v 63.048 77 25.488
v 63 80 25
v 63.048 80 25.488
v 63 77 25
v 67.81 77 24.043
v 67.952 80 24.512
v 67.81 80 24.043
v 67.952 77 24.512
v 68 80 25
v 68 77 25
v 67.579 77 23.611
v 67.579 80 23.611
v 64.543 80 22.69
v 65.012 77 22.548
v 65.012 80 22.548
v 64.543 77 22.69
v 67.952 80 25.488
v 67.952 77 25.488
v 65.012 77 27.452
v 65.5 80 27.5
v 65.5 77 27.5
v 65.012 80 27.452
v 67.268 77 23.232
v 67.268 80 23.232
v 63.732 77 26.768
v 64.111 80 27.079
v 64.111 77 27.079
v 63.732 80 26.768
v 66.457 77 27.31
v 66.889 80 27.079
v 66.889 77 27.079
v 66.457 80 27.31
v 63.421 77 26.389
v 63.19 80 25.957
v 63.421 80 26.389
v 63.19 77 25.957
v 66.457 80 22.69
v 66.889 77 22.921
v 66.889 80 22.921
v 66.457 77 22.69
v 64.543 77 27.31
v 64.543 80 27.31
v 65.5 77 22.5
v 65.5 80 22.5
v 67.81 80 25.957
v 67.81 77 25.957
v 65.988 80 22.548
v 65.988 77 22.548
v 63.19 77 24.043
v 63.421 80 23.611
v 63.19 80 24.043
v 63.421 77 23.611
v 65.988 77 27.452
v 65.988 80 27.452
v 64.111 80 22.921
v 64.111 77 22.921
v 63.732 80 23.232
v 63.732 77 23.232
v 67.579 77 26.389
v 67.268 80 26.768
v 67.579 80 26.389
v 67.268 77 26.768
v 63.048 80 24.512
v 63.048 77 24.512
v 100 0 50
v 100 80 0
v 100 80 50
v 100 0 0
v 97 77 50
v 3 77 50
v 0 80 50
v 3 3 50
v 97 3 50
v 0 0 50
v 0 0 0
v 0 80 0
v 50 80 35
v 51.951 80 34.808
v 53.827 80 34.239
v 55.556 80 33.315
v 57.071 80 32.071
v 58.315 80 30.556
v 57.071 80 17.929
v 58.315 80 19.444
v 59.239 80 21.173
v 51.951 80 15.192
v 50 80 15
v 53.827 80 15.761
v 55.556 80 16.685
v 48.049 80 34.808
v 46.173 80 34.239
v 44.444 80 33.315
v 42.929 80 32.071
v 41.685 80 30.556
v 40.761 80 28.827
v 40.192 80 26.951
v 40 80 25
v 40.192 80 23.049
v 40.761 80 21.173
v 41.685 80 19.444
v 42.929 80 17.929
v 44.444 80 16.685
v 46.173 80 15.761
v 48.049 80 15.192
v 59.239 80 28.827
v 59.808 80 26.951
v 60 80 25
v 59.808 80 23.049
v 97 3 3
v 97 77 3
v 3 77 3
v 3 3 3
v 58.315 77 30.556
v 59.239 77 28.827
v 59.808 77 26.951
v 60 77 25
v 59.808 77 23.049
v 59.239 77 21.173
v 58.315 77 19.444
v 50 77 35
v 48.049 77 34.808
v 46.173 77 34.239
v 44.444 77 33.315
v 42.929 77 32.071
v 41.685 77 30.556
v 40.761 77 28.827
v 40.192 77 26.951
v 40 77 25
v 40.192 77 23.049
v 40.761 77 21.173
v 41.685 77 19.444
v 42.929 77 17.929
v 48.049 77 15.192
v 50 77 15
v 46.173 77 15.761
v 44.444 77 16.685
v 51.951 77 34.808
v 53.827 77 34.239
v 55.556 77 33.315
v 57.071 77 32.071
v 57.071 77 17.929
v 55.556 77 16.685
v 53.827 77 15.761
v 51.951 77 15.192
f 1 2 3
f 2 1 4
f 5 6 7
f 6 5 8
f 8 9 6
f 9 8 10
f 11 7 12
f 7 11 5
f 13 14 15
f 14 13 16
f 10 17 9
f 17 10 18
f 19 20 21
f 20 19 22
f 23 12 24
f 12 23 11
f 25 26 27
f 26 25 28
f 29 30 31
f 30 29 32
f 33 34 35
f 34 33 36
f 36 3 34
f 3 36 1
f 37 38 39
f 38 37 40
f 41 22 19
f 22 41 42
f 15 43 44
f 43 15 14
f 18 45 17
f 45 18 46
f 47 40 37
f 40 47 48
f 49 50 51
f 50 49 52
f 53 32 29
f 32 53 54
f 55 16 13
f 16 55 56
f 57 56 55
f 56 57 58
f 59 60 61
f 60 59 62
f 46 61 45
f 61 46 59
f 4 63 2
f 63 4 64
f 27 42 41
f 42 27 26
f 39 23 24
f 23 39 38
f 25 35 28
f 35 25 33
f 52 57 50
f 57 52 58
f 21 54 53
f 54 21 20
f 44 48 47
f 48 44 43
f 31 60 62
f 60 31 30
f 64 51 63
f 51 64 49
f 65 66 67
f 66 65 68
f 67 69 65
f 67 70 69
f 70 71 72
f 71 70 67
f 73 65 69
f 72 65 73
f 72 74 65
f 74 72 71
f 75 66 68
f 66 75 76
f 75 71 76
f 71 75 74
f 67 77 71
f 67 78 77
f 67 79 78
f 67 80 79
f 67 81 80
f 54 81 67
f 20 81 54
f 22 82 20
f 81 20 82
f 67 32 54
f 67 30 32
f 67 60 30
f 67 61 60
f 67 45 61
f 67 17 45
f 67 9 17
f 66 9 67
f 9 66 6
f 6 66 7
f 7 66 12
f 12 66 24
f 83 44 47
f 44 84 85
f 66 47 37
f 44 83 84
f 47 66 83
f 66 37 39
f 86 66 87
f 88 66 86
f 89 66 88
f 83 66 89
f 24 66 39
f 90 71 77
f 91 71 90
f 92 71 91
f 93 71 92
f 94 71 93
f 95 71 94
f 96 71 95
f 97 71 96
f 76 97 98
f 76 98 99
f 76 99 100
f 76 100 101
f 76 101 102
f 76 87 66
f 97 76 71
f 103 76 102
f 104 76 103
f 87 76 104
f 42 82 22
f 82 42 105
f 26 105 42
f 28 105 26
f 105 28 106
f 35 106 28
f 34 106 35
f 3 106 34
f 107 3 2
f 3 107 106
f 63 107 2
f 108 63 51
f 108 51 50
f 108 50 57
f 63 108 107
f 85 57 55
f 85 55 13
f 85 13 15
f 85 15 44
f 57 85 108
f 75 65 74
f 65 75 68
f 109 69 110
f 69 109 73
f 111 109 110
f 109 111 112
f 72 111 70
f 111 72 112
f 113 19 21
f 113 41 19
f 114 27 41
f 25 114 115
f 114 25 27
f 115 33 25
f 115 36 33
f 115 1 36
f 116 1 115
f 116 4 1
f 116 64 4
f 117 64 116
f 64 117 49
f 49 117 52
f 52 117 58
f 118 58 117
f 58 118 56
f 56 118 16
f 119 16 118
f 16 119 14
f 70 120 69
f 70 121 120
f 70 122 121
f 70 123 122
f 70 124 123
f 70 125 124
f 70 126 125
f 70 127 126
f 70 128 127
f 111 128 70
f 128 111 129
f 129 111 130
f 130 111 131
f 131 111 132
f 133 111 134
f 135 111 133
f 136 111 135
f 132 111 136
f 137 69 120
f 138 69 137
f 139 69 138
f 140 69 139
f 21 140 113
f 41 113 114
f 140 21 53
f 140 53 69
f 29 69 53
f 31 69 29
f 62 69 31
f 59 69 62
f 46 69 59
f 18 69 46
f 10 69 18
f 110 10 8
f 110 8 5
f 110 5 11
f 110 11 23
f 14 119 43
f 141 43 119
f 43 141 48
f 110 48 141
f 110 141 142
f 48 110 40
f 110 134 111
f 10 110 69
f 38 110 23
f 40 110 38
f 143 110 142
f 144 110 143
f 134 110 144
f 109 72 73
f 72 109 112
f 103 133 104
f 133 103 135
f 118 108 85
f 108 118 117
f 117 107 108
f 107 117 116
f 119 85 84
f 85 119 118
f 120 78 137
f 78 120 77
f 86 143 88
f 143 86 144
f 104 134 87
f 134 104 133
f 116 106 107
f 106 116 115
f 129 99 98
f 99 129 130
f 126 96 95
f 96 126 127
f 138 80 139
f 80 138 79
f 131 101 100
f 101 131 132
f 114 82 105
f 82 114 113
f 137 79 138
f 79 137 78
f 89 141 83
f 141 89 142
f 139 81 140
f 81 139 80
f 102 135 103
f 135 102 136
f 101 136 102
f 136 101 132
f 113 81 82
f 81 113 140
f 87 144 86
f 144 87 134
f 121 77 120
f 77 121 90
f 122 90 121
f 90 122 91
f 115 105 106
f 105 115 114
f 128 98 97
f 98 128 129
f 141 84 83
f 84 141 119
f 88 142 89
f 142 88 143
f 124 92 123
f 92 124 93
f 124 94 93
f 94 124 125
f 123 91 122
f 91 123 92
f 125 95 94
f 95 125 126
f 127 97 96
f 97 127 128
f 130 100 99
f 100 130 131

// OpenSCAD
$fn = 32;

// ----------------------------------------------------------------------
// Vent box: roundvent enclosure
// ----------------------------------------------------------------------

// --- parameters (mm) ---
box_l = 100;              // box length, X
box_w = 80;               // box width, Y
box_h = 50;               // box height, Z
wall_t = 3;               // shell wall thickness
vent_d = 20;              // central vent diameter
ring_d = 5;               // ring hole diameter
n_ring = 8;               // holes in the ring
ring_r = 15.5;            // ring radius

ring_step = 360 / n_ring;  // ring hole angular step

difference() {
  cube([box_l, box_w, box_h]);
  translate([wall_t, wall_t, wall_t])
    cube([box_l - 2 * wall_t, box_w - 2 * wall_t, box_h]);
  translate([box_l / 2, box_w - wall_t - 1, box_h / 2])
    rotate([-90, 0, 0]) cylinder(h = wall_t + 2, d = vent_d);
  for (i = [0 : n_ring - 1])
    translate([box_l / 2, box_w - wall_t - 1, box_h / 2])
      rotate([0, 0, i * ring_step])
        translate([ring_r, 0, 0]) rotate([-90, 0, 0])
          cylinder(h = wall_t + 2, d = ring_d);
}
